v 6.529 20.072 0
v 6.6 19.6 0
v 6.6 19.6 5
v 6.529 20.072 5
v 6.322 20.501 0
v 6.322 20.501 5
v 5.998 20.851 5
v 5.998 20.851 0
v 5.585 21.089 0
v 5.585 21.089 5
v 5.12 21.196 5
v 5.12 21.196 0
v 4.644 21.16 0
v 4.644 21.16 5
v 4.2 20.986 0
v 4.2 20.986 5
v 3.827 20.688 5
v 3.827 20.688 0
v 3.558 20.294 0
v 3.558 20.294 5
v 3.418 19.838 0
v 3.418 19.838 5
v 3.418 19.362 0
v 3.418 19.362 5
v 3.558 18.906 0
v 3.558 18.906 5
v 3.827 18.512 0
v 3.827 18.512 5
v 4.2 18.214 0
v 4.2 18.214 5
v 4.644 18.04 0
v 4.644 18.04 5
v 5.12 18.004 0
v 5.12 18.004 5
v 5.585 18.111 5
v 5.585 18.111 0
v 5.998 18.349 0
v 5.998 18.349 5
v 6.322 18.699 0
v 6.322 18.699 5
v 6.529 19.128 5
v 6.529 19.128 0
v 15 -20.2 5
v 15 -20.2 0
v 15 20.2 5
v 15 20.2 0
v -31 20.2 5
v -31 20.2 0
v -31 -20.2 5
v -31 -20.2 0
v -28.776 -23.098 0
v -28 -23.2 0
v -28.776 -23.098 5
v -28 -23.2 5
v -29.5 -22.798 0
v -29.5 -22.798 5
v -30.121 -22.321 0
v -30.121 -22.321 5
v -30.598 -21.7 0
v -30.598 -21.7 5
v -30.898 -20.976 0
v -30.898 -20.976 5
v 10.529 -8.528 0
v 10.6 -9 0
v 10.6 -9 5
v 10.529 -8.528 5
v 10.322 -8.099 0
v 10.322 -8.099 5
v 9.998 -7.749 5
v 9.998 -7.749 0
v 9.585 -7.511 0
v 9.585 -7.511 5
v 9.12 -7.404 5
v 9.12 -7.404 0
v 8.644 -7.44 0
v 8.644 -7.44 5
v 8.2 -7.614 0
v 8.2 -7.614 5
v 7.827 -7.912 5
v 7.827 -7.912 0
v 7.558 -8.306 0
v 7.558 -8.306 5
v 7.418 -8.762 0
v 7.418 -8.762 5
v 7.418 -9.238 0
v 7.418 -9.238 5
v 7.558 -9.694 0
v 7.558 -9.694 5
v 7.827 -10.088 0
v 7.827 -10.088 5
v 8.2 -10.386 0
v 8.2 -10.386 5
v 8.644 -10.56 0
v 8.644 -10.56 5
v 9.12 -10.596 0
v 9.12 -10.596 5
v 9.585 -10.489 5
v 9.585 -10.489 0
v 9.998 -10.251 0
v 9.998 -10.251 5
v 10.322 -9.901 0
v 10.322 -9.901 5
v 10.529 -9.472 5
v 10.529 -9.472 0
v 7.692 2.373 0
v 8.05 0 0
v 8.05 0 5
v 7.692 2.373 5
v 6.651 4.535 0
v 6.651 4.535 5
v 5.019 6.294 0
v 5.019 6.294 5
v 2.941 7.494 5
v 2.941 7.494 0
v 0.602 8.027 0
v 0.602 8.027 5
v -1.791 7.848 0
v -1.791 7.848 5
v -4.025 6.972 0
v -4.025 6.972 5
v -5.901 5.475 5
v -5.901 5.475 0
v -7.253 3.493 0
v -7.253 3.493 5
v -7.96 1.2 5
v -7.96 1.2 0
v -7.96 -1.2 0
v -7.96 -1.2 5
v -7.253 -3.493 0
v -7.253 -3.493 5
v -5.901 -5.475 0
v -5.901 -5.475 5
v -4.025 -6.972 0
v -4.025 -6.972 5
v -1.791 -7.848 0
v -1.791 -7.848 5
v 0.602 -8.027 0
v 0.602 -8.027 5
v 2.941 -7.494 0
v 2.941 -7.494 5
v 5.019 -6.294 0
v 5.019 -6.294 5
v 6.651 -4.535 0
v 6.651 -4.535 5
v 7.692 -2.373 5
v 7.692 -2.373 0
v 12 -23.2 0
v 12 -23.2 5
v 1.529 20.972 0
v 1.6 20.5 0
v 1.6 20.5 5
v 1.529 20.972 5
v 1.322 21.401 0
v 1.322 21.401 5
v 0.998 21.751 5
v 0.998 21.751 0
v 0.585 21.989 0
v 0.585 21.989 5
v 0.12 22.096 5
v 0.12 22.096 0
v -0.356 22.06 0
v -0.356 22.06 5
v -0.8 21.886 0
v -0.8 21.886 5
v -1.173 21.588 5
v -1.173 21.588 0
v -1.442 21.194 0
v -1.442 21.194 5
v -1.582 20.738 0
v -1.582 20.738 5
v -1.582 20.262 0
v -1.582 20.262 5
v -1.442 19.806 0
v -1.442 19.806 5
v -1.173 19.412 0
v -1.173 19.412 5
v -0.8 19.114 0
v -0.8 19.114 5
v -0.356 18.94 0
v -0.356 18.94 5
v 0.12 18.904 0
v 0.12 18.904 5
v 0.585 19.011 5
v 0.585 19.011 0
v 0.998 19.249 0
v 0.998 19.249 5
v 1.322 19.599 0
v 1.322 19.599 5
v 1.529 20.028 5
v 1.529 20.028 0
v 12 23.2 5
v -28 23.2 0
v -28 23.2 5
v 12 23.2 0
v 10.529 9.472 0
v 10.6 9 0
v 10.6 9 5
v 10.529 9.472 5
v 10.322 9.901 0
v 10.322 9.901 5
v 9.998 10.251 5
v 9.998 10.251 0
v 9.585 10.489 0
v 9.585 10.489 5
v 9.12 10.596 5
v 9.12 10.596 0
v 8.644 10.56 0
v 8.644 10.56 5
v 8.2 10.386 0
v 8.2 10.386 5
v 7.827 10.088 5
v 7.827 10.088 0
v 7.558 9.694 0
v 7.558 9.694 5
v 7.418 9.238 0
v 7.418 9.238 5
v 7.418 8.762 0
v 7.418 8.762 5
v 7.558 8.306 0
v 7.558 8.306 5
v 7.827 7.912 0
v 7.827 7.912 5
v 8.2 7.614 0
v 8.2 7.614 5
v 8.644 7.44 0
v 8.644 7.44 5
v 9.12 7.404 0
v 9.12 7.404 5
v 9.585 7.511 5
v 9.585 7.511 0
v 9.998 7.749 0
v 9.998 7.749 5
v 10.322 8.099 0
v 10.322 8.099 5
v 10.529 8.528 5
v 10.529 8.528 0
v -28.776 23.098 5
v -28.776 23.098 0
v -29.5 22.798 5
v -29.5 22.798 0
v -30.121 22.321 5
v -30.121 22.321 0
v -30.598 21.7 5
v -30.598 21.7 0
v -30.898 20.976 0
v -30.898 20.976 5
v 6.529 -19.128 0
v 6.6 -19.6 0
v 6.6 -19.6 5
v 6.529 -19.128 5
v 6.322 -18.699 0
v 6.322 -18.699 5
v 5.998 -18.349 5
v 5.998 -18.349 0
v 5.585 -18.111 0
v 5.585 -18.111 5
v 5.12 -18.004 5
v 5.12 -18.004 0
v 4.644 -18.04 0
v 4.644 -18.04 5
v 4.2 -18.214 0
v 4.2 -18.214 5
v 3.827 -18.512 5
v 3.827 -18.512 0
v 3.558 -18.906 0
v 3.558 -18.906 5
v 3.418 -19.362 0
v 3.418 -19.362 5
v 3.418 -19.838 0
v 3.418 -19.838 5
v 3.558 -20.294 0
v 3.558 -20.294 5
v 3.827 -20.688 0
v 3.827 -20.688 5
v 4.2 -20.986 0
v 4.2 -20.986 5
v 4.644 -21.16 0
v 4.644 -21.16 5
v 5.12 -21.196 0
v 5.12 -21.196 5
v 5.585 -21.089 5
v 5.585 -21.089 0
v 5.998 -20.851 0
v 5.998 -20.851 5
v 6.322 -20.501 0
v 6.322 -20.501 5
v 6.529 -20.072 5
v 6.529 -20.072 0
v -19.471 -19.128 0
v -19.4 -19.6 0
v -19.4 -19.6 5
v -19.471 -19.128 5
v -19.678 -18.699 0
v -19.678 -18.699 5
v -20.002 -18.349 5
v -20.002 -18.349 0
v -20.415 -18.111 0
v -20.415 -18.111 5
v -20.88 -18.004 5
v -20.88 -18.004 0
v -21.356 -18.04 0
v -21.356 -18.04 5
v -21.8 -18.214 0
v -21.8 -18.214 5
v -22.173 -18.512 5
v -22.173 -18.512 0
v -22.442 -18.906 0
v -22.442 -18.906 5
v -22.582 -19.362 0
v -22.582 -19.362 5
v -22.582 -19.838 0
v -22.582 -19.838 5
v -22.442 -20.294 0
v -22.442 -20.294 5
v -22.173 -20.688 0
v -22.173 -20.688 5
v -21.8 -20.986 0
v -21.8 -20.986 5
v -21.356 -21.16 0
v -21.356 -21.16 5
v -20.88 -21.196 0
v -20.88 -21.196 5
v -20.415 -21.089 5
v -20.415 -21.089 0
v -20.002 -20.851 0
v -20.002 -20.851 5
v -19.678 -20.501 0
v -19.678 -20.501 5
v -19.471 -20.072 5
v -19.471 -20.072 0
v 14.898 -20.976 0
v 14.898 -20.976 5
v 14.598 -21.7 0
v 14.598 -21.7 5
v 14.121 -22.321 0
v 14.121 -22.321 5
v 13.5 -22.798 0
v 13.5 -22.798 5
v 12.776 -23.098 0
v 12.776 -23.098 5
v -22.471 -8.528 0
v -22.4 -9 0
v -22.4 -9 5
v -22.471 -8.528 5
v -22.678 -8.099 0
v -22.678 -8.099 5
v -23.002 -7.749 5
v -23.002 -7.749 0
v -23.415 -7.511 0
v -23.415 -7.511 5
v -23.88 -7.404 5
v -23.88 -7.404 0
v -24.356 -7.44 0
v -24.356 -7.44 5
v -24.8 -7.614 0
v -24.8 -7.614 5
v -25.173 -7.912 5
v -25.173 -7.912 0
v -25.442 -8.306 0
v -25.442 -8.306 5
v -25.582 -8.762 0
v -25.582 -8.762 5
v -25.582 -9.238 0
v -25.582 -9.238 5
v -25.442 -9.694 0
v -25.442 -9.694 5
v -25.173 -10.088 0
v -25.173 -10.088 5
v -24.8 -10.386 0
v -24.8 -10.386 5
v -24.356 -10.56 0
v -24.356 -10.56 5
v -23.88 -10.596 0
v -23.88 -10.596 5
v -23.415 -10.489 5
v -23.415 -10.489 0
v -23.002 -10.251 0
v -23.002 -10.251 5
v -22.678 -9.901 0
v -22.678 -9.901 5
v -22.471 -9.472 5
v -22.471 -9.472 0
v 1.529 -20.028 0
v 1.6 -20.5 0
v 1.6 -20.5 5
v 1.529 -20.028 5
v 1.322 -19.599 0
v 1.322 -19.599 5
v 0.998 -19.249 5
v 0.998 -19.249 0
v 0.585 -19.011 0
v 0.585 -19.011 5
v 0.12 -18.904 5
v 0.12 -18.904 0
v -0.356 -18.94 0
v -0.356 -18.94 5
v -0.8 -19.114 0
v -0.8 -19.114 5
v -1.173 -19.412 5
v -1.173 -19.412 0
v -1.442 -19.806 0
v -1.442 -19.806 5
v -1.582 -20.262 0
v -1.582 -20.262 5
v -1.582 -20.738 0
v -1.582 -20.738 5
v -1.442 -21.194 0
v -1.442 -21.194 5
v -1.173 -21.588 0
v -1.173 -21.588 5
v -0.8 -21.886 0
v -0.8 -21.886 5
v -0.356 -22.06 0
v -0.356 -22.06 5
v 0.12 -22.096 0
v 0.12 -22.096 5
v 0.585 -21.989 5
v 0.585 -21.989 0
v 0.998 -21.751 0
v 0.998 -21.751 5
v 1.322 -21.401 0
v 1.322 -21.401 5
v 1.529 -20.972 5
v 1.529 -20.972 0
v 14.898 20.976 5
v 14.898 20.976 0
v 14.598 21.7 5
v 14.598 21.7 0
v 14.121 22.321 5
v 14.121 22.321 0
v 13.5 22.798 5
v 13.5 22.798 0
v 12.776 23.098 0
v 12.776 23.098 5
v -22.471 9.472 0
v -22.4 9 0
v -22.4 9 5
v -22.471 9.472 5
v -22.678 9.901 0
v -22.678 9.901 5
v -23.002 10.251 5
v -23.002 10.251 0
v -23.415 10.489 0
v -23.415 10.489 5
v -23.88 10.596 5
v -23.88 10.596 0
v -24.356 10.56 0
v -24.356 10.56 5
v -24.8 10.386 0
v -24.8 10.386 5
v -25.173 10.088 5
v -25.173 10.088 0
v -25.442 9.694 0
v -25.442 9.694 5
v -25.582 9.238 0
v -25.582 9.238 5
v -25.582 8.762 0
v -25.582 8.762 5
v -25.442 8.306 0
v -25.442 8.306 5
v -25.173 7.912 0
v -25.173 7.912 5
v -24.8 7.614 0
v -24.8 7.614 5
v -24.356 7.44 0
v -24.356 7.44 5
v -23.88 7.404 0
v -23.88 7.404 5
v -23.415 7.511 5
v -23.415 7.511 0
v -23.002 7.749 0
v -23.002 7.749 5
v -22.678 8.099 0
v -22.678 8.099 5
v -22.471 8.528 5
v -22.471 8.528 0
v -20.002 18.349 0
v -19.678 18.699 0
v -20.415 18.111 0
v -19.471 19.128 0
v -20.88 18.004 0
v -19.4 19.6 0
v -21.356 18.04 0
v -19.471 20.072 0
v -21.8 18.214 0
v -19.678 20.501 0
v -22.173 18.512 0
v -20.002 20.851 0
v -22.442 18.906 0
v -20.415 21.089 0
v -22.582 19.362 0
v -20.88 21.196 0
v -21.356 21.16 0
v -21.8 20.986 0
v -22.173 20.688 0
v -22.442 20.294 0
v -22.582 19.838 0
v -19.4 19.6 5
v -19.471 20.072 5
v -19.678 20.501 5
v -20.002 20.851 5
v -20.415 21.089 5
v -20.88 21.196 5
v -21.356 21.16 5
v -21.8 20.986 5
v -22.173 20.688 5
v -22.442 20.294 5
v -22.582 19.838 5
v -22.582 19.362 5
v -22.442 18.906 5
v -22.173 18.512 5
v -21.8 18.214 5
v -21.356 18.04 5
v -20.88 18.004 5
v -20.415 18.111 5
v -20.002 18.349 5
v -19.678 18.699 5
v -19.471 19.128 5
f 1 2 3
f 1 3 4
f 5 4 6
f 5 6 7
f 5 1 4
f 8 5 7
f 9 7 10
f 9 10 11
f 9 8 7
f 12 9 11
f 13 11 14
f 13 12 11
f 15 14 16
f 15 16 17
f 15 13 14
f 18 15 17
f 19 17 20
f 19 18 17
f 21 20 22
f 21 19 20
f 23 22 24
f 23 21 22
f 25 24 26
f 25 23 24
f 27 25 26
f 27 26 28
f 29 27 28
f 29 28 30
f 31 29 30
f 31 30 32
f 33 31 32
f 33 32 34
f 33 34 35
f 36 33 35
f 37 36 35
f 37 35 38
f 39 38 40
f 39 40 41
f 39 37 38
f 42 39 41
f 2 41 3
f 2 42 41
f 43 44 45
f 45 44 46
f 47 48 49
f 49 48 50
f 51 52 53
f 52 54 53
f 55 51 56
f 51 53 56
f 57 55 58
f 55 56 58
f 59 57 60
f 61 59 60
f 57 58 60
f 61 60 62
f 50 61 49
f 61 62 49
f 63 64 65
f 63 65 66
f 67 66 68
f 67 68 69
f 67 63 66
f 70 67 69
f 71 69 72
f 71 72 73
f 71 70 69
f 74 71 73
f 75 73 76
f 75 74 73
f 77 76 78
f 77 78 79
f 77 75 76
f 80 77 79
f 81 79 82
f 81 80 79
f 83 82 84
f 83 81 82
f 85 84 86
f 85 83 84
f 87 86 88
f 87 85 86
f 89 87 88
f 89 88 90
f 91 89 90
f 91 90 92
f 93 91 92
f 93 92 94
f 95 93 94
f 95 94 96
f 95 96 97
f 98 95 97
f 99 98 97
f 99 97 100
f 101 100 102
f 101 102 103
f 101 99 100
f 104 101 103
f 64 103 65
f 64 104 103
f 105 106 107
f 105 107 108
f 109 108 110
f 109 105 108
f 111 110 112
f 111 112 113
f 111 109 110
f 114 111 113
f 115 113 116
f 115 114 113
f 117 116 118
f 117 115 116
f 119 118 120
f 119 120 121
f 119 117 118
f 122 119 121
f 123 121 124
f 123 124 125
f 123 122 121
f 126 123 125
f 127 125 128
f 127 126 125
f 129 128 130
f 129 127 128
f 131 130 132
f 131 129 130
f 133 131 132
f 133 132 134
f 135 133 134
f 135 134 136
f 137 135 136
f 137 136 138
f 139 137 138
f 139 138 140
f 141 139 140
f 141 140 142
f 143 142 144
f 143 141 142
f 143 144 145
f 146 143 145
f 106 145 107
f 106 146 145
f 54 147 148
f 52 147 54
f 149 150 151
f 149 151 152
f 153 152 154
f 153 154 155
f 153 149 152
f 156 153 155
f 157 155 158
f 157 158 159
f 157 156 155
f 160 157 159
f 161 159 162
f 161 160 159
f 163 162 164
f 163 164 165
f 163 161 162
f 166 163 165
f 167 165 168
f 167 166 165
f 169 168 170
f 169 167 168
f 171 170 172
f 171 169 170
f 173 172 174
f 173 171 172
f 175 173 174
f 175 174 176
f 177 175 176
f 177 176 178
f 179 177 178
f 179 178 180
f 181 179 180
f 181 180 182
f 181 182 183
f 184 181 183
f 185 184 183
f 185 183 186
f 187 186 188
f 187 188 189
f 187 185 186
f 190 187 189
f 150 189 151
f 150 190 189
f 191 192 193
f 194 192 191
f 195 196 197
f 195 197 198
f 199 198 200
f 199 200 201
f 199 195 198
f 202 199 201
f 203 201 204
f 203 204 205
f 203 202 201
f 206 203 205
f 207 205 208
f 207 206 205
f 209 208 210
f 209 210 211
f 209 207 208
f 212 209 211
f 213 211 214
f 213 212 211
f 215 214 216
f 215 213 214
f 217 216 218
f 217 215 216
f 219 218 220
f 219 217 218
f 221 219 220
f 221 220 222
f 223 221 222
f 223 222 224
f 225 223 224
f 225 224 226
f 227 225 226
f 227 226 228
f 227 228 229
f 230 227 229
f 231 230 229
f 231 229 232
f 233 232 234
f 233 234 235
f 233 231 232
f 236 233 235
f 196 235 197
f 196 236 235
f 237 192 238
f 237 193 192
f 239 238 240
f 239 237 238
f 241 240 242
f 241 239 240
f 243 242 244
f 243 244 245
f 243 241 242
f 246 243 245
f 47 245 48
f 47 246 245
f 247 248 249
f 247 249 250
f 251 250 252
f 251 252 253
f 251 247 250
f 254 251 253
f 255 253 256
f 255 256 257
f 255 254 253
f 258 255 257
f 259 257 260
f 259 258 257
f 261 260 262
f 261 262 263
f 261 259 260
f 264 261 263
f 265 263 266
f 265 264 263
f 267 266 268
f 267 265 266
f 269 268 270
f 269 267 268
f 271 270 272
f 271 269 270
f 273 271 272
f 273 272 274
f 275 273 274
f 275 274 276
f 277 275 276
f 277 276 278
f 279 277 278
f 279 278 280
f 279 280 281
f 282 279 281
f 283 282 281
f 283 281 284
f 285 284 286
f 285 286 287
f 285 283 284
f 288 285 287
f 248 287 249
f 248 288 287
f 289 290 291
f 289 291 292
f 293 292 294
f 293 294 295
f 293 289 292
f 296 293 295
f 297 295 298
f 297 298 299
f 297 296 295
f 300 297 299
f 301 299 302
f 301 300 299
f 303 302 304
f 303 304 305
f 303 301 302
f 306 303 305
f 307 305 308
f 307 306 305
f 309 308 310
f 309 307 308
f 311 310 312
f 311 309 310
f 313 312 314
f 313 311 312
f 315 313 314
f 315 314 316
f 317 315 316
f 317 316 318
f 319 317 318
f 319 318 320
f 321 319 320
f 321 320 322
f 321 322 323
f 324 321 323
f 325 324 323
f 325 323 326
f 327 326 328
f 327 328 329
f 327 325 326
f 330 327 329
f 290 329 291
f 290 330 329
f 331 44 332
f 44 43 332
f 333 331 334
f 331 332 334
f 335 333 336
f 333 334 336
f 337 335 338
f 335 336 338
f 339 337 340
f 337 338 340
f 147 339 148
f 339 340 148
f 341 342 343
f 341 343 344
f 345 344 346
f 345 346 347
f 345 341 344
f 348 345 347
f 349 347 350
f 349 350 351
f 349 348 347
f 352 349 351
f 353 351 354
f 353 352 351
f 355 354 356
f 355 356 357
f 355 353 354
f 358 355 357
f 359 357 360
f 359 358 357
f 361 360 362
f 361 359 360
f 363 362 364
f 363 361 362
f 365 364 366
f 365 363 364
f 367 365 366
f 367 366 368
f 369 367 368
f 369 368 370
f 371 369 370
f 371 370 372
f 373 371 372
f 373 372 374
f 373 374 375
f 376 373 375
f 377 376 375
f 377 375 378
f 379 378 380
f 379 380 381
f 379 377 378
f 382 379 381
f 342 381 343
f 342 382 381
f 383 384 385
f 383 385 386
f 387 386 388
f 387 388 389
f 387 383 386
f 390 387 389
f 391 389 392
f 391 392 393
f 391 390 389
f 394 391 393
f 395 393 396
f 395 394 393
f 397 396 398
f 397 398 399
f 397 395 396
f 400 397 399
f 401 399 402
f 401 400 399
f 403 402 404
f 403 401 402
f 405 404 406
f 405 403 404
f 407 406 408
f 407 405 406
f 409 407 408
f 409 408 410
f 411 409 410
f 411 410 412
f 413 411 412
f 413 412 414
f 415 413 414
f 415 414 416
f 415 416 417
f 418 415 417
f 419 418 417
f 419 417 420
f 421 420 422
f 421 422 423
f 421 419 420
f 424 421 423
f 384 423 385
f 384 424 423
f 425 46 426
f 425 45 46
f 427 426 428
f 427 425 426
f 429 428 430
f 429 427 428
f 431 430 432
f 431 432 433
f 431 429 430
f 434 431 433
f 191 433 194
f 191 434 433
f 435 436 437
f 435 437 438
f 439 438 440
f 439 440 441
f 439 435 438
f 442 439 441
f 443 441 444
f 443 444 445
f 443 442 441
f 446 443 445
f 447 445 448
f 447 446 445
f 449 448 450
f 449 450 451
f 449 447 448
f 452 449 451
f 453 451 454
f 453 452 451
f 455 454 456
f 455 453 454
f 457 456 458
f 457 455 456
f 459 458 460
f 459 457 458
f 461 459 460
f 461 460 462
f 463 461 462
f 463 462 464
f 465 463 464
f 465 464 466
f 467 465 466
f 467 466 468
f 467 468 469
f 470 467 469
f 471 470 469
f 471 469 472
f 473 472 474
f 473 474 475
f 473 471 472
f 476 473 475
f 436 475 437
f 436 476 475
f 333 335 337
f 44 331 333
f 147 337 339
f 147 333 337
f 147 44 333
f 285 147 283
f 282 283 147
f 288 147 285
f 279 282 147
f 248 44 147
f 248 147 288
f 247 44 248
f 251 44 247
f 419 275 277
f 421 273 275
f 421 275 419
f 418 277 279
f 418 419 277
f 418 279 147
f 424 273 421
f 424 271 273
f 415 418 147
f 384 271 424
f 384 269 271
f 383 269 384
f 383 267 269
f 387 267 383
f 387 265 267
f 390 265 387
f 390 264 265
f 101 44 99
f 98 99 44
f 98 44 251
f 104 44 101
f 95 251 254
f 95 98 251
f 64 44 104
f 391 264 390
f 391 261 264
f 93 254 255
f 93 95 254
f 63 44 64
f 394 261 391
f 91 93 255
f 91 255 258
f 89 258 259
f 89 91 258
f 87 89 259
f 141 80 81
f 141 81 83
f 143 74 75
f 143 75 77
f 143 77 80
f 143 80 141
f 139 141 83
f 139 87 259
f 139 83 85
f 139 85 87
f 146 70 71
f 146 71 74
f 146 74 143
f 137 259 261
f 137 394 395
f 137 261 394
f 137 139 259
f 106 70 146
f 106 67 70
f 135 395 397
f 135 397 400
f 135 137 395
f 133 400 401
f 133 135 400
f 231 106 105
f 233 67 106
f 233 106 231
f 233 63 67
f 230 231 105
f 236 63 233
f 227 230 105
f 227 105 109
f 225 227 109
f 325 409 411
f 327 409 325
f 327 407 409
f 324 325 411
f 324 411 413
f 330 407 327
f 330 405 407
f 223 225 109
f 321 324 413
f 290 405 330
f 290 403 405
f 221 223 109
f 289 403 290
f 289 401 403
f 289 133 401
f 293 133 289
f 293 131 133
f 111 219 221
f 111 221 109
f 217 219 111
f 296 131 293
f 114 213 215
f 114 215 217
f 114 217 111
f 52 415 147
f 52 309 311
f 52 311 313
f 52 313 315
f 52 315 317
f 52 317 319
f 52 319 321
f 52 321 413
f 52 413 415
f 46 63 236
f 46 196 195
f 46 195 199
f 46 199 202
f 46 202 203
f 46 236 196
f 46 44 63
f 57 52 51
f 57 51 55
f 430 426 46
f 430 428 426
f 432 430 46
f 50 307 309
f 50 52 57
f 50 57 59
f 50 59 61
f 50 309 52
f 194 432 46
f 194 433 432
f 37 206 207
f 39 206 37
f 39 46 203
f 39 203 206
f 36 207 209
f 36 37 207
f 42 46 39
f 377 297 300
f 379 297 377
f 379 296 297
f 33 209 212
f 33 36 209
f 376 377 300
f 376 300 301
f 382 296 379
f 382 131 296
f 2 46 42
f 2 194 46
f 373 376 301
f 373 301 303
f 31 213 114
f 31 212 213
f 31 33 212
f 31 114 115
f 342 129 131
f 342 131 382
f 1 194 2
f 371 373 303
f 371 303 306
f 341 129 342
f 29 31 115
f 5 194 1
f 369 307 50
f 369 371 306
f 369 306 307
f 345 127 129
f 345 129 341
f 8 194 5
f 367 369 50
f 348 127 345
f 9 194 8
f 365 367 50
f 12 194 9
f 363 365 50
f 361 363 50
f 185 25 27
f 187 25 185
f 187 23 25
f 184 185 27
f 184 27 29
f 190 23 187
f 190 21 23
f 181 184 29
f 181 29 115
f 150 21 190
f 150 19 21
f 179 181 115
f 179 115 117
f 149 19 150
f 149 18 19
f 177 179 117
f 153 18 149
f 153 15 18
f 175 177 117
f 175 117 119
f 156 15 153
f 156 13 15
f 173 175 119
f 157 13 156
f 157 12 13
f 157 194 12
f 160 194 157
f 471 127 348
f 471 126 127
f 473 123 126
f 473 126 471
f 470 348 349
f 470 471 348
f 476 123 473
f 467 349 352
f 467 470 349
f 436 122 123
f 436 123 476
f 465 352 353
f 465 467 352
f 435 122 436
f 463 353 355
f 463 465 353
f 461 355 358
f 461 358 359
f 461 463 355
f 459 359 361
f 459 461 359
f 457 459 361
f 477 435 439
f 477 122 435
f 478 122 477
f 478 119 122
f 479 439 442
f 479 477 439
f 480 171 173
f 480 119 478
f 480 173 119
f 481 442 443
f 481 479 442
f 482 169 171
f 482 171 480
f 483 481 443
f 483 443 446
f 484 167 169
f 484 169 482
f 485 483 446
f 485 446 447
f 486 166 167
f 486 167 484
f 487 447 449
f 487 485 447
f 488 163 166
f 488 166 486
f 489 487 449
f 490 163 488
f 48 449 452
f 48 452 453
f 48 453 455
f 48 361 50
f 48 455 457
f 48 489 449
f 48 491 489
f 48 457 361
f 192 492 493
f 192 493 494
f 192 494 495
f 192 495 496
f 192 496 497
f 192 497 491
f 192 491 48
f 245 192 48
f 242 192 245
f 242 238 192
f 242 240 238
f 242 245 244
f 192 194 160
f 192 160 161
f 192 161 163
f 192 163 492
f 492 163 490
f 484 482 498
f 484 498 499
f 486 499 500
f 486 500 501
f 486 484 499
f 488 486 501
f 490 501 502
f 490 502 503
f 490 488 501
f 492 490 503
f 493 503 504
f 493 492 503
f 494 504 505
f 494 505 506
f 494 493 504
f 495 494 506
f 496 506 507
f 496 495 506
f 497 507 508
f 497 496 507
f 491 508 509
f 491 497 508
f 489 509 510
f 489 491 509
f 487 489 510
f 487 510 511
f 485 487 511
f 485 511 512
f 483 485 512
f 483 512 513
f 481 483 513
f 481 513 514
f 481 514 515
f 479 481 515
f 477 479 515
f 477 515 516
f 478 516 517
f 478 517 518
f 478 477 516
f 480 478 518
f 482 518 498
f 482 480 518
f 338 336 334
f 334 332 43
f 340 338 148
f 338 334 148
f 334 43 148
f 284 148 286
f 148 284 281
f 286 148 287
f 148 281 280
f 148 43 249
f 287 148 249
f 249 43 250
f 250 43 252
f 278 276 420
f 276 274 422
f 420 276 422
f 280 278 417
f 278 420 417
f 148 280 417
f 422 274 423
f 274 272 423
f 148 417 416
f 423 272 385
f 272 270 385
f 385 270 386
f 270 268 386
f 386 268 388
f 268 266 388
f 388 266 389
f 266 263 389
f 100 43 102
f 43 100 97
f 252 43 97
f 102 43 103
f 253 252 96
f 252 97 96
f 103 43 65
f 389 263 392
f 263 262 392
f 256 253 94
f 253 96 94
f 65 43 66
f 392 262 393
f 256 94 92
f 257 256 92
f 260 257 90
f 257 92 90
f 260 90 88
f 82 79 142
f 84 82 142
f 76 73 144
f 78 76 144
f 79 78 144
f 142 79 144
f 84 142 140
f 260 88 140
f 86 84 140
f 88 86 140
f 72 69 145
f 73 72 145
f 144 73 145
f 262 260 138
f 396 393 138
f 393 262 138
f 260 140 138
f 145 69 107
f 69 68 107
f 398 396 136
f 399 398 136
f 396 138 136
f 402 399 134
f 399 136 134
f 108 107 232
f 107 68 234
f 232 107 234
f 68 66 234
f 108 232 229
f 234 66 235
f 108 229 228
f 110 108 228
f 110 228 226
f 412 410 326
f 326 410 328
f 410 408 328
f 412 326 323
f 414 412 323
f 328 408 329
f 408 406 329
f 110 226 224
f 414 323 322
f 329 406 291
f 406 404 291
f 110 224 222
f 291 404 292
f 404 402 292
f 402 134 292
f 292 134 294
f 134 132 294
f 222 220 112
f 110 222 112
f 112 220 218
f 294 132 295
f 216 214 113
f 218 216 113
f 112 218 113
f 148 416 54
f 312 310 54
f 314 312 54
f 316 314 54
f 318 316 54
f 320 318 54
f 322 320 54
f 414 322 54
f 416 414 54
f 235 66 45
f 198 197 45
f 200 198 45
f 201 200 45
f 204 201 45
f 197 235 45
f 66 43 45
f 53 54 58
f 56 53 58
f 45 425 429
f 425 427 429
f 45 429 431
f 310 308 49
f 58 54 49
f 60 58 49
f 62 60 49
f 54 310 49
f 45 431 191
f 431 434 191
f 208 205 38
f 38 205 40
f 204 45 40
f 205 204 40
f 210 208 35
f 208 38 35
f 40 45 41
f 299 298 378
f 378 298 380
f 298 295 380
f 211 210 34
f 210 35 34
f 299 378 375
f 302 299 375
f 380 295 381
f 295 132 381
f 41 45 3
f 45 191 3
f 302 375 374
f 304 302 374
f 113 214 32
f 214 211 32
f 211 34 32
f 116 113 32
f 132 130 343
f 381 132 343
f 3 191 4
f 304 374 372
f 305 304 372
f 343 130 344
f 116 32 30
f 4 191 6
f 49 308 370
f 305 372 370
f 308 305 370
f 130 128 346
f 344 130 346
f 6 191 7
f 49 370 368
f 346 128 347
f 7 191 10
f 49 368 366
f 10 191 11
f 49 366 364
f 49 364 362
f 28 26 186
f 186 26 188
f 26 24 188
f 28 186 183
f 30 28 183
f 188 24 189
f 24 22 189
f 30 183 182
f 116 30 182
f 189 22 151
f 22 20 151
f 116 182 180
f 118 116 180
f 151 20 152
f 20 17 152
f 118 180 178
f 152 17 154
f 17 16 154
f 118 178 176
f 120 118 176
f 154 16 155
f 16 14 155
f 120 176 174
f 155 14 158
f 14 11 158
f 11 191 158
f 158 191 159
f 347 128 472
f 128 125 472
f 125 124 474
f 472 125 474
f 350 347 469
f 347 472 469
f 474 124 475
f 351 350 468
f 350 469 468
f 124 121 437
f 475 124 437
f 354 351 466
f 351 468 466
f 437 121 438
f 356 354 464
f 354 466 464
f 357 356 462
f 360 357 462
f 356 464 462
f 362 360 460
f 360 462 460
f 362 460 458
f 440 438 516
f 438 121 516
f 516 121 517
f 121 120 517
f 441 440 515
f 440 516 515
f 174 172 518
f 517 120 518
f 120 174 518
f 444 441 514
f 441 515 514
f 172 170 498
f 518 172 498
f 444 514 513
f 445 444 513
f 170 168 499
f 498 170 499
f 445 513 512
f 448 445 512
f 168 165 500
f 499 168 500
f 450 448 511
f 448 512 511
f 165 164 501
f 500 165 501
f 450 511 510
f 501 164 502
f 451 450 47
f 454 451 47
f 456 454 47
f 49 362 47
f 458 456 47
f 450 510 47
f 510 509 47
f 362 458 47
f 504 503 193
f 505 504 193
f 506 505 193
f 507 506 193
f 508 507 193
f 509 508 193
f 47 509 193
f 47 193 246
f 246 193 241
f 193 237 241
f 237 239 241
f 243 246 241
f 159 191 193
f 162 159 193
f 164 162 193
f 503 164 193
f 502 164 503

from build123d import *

# Parameters (mm, degrees)
SKETCH_R   = 8.05
SKETCH_R_2 = 1.6
PAD_DEPTH  = 5
FILLET_R   = 3


with BuildPart() as part:
    # Sketch → Pad (new body)
    with BuildSketch(Plane.XY):
        Polygon((15, 16), (15, -16), (15, -23.2), (-31, -23.2), (-31, -16), (-31, 16), (-31, 23.2), (15, 23.2), align=None)
        Circle(SKETCH_R, mode=Mode.SUBTRACT)
        with Locations((-24, 9)):
            Circle(SKETCH_R_2, mode=Mode.SUBTRACT)
        with Locations((-24, -9)):
            Circle(SKETCH_R_2, mode=Mode.SUBTRACT)
        with Locations((9, -9)):
            Circle(SKETCH_R_2, mode=Mode.SUBTRACT)
        with Locations((9, 9)):
            Circle(SKETCH_R_2, mode=Mode.SUBTRACT)
        with Locations((0, 20.5)):
            Circle(SKETCH_R_2, mode=Mode.SUBTRACT)
        with Locations((0, -20.5)):
            Circle(SKETCH_R_2, mode=Mode.SUBTRACT)
        with Locations((-21, 19.6)):
            Circle(SKETCH_R_2, mode=Mode.SUBTRACT)
        with Locations((5, 19.6)):
            Circle(SKETCH_R_2, mode=Mode.SUBTRACT)
        with Locations((-21, -19.6)):
            Circle(SKETCH_R_2, mode=Mode.SUBTRACT)
        with Locations((5, -19.6)):
            Circle(SKETCH_R_2, mode=Mode.SUBTRACT)
    extrude(amount=PAD_DEPTH)

    # Fillet
    fillet_edges = [part.edges().sort_by_distance(p)[0] for p in [
        (-31, -23.2, 2.5),
        (-31, 23.2, 2.5),
        (15, 23.2, 2.5),
        (15, -23.2, 2.5),
    ]]
    fillet(fillet_edges, radius=FILLET_R)


solid = part.part
